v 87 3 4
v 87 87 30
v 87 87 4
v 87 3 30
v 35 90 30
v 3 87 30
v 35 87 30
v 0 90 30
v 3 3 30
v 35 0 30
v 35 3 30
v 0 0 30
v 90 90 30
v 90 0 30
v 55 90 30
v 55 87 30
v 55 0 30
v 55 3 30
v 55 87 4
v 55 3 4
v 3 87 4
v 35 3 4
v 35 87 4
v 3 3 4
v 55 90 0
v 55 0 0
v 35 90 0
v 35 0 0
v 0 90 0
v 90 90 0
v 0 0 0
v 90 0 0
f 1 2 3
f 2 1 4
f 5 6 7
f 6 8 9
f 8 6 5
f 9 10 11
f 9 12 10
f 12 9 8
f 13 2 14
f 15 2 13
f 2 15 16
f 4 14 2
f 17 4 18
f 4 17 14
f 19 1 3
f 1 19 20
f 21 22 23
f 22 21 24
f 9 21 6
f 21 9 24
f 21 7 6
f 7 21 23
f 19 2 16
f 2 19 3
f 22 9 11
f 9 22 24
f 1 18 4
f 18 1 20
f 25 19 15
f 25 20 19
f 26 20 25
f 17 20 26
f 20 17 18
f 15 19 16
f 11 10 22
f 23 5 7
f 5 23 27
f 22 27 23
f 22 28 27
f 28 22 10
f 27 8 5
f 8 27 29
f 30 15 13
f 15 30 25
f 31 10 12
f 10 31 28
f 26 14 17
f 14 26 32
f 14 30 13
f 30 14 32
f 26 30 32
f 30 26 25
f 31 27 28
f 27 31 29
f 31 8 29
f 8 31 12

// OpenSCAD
$fn=48;
translate([0,0,0])
{
difference()
{
    cube(size = [90.00, 90.00, 30.00], center = false); 
    translate(v = [3.00, 3.00, 4.00])
    {
        union()
        {
            cube(size = [84.00, 84.00, 26.00], center = false); 
            translate(v = [32.00, -3.00, -20.00])
            {
                translate(v = [0.00, 0.00, 0.00])
                {
                    cube(size = [20.00, 90.00, 46.00], center = false); 
                }
            }
        }
    }
}

}
